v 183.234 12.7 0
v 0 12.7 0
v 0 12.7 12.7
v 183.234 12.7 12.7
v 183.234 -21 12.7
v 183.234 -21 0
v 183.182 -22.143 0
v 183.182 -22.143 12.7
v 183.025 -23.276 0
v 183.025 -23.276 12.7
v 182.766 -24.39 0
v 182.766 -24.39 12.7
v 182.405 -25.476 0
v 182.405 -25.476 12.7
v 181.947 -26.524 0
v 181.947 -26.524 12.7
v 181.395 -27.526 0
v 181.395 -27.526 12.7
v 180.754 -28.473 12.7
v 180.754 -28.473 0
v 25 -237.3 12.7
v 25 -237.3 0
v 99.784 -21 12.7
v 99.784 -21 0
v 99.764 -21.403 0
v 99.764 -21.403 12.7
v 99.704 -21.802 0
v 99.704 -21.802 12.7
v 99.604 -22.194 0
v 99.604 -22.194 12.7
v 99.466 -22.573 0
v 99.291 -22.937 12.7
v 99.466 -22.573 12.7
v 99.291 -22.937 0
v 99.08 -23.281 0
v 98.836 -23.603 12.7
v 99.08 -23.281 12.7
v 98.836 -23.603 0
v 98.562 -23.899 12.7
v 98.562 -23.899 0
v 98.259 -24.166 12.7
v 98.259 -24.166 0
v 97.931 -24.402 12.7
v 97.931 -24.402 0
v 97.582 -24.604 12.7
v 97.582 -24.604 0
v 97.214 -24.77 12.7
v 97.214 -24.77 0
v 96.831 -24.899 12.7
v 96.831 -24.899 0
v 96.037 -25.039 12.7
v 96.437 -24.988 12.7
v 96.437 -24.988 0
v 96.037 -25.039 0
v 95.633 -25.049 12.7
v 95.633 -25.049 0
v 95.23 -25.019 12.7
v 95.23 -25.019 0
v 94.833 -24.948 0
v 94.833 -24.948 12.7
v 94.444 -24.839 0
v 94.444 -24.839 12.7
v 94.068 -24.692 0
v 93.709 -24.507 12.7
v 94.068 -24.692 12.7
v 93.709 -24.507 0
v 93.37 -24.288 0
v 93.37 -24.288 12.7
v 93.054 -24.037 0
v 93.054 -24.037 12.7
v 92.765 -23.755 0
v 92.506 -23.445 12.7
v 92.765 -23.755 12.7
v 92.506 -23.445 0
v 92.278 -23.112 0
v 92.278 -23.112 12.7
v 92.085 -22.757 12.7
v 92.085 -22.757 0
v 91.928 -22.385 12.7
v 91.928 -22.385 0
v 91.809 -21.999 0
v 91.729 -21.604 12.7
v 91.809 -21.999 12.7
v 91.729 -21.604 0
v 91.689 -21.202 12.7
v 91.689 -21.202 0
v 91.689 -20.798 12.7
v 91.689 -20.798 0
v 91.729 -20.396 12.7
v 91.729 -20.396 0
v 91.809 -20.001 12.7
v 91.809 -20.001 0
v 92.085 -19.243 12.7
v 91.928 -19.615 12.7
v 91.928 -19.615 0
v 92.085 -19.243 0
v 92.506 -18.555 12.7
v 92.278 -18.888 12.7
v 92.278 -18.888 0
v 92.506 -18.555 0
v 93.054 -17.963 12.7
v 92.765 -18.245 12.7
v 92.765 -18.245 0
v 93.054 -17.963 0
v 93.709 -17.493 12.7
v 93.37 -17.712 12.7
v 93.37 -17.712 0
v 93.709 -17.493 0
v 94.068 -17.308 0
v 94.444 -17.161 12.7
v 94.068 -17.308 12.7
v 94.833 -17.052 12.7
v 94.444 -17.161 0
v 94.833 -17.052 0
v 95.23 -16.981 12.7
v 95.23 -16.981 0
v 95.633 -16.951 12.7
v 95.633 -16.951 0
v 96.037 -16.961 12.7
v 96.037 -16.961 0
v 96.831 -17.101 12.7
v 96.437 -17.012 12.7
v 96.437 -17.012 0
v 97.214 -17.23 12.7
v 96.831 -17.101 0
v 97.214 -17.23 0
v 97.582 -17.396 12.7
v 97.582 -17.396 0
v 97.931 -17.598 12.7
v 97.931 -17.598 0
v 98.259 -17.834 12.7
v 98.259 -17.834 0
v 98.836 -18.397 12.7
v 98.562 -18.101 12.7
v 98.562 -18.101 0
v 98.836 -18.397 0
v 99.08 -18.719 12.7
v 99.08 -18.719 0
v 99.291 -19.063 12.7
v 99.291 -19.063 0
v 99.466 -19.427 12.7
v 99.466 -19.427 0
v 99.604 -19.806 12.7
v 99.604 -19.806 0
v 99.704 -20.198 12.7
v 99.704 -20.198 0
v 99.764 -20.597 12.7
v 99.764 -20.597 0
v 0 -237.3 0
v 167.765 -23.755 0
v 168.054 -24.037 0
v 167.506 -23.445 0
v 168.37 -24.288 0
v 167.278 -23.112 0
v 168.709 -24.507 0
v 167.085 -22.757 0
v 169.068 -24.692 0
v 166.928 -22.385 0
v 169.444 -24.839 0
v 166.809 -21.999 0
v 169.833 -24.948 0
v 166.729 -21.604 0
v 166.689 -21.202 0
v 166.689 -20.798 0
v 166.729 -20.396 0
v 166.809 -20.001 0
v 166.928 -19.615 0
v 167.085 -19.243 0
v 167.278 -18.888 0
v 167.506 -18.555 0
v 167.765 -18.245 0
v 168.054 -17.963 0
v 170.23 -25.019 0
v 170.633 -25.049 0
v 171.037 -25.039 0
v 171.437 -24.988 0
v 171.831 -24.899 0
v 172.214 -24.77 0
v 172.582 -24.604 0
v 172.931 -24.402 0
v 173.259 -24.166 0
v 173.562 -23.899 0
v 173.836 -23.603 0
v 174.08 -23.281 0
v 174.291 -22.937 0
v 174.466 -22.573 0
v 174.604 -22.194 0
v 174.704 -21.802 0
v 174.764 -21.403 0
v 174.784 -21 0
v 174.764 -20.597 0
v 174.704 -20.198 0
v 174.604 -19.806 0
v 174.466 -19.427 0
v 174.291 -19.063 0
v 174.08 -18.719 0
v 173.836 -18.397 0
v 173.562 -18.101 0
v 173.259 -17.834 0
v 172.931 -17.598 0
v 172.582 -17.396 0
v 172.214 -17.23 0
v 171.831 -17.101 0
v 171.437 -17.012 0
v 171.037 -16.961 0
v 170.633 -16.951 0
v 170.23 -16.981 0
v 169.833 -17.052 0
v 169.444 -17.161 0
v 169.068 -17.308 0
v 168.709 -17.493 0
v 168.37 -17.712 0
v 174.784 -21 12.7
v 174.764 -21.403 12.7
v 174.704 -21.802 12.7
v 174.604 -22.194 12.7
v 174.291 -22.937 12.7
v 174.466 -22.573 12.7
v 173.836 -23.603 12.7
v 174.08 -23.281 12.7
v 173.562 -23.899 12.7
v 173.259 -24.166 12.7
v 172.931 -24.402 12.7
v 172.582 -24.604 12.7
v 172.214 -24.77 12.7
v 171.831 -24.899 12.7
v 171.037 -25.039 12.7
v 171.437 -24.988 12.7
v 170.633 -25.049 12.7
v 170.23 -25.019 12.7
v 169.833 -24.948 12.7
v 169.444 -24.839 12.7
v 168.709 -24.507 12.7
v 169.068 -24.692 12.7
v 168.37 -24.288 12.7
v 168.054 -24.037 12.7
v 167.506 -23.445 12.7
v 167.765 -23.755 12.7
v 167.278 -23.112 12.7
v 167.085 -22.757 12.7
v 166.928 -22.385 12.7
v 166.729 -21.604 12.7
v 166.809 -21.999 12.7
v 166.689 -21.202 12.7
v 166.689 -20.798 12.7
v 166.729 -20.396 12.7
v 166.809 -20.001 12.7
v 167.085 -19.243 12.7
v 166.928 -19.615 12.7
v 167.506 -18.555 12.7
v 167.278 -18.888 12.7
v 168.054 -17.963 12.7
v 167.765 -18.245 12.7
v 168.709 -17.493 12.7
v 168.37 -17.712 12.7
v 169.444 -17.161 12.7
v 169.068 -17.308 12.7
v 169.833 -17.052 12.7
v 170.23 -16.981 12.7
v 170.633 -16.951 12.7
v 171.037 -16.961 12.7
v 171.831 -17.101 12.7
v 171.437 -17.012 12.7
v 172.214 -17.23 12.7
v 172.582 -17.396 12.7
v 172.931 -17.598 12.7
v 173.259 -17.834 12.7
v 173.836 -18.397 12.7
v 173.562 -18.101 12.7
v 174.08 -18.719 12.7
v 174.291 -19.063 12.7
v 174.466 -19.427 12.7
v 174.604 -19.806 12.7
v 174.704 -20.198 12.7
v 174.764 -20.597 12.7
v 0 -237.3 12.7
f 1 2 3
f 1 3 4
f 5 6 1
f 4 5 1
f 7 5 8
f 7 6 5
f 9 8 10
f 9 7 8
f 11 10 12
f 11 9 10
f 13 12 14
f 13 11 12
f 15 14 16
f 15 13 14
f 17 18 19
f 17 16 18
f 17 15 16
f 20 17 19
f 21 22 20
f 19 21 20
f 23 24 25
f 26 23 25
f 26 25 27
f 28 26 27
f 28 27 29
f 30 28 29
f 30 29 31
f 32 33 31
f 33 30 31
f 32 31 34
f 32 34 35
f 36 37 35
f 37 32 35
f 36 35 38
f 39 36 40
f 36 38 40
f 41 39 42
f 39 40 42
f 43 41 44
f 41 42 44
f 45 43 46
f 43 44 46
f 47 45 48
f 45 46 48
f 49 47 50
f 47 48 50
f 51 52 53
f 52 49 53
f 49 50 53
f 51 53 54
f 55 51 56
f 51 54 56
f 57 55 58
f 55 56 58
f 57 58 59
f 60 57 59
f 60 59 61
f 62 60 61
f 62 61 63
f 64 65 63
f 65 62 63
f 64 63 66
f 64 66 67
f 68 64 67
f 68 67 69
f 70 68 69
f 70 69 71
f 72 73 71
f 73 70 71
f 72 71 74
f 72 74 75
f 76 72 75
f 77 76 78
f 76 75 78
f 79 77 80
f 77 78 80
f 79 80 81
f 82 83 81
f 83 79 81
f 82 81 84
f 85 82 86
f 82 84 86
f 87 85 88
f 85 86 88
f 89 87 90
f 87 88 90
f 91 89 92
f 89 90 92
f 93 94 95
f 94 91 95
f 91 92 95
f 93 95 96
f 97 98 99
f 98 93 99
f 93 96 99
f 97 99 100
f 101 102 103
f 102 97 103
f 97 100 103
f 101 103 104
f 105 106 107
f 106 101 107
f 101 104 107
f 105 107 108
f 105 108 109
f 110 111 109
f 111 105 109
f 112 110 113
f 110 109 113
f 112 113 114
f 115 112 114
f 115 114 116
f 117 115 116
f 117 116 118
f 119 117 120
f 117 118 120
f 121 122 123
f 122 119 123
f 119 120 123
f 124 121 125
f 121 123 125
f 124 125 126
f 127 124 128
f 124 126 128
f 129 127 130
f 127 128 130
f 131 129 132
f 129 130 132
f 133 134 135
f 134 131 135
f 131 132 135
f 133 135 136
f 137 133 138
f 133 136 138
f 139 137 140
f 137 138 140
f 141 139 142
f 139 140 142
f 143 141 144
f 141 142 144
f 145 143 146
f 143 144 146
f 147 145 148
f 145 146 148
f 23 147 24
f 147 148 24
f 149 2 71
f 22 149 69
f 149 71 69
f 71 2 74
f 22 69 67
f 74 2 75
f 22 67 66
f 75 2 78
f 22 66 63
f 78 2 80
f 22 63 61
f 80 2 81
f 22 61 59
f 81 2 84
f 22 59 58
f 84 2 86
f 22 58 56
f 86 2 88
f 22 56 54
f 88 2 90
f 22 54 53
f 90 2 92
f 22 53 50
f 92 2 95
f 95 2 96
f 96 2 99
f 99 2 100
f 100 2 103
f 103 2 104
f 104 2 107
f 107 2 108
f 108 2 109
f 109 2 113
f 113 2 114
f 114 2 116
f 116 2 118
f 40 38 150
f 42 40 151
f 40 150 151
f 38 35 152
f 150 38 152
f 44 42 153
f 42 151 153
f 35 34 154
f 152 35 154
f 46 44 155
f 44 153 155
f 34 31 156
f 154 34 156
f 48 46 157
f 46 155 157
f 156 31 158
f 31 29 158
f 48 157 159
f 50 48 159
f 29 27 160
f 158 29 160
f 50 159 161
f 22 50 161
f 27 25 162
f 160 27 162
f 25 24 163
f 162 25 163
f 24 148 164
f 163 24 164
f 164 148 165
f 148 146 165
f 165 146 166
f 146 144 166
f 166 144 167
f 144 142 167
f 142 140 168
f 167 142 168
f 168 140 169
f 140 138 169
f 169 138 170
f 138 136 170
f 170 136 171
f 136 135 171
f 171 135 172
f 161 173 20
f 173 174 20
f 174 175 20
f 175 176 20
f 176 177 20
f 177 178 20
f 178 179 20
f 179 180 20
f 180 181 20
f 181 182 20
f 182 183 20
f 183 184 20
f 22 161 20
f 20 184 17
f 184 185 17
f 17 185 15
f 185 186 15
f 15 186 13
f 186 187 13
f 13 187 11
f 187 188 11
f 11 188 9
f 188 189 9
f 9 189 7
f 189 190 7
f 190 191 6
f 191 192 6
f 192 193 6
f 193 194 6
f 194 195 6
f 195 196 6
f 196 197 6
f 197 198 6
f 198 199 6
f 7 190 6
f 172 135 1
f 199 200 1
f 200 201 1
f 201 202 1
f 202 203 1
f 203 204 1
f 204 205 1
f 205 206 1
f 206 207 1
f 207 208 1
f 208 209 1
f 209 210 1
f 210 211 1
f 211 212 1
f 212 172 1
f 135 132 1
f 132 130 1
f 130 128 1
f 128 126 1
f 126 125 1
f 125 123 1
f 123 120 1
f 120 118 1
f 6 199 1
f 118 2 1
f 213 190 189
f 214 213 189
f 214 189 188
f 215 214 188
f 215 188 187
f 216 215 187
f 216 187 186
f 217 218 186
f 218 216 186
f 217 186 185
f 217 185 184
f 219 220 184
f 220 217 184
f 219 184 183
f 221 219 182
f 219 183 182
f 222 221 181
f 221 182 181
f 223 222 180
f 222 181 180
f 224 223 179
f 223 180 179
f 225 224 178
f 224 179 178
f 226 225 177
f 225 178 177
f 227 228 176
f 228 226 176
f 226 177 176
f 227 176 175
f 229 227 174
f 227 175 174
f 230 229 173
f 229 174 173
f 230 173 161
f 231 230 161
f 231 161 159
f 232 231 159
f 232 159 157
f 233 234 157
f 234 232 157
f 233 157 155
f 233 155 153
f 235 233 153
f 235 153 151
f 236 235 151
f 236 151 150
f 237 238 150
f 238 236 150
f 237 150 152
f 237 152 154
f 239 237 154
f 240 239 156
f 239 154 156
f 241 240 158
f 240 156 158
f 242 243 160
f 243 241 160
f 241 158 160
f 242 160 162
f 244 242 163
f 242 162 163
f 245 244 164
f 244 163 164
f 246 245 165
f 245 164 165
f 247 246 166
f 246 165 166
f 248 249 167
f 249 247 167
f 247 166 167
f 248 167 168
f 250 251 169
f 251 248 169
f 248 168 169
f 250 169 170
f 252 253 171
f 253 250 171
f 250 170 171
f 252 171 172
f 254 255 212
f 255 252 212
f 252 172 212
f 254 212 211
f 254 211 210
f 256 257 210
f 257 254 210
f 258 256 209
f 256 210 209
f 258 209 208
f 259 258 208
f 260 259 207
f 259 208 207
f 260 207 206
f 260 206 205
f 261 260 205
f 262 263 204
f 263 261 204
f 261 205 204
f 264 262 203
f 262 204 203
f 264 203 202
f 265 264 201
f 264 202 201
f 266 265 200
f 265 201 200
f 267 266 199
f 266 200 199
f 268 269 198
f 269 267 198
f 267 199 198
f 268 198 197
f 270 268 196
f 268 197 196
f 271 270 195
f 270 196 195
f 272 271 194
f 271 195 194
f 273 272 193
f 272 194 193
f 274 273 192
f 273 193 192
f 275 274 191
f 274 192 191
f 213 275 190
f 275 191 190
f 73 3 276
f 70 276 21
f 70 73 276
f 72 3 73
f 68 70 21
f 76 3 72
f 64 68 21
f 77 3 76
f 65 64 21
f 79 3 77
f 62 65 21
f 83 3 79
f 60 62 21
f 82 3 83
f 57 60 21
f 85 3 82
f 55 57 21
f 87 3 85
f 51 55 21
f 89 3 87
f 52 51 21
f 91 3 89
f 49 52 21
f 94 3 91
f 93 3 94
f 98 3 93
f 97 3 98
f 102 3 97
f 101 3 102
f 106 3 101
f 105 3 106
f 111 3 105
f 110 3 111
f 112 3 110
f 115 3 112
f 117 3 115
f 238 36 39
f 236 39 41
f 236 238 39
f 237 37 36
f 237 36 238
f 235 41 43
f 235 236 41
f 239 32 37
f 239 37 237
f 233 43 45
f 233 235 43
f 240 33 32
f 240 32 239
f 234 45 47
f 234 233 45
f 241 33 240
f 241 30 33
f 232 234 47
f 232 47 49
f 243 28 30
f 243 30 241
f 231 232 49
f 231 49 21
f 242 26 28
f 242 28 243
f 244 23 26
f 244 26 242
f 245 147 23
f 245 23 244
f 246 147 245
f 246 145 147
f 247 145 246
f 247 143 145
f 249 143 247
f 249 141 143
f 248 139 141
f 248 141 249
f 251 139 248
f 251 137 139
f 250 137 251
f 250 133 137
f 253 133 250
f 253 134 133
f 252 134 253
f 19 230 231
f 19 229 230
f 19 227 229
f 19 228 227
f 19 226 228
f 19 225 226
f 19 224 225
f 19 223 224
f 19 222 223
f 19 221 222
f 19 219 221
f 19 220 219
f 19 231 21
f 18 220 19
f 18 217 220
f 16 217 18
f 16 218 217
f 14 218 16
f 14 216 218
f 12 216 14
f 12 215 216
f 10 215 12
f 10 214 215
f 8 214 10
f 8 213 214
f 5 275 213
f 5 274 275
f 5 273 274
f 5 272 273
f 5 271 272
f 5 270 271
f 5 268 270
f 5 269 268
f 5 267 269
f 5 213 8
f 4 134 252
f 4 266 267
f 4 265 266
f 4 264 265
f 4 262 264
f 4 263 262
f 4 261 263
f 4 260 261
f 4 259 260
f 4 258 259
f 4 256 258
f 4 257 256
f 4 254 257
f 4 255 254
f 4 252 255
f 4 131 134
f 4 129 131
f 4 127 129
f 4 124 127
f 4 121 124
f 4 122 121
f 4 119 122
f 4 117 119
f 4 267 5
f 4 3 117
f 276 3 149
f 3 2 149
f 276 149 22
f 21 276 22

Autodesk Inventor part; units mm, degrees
ref_plane "YZ Plane" through (0, 0, 0) normal (1, 0, 0) x (0, 1, 0)
ref_plane "XZ Plane" through (0, 0, 0) normal (0, 1, 0) x (-1, 0, 0)
ref_plane "XY Plane" through (0, 0, 0) normal (0, 0, 1) x (1, 0, 0)
ref_plane "Work Plane1" through (0, 0, 0) normal (0, 0, 1) x (1, 0, 0)
sketch "Sketch1" plane through (0, 0, 0) normal (0, 0, 1) x (1, 0, 0)
  circle A0 centre (95.734, -21) radius 4.05 projected
  circle A1 centre (170.734, -21) radius 4.05 projected
  line L0 (78.234, -5) -> (78.234, 0) projected
  arc A2 (83.234, -10) -> (78.234, -5) centre (78.234, -10) ccw projected
  line L1 (83.234, -10) -> (83.234, -21) projected
  arc A3 (83.234, -21) -> (108.234, -21) centre (95.734, -21) ccw projected
  line L2 (108.234, -21) -> (108.234, -10) projected
  arc A4 (113.234, -5) -> (108.234, -10) centre (113.234, -10) ccw projected
  line L3 (113.234, -5) -> (153.234, -5) projected
  arc A5 (158.234, -10) -> (153.234, -5) centre (153.234, -10) ccw projected
  line L4 (158.234, -10) -> (158.234, -21) projected
  arc A6 (158.234, -21) -> (183.234, -21) centre (170.734, -21) ccw projected
  line L5 (183.234, -21) -> (183.234, -10) projected
  arc A7 (188.234, -5) -> (183.234, -10) centre (188.234, -10) ccw projected
  line L6 (188.234, 0) -> (188.234, -5) projected
  line L7 (78.234, 0) -> (188.234, 0) projected
  line L8 (437.5, 12.7) -> (437.5, 0) projected
  line L9 (0, 12.7) -> (437.5, 12.7) projected
  line L10 (0, 0) -> (0, 12.7) projected
  line L11 (437.5, 0) -> (0, 0) projected
  line L12 (0, 12.7) -> (0, -237.3)
  line L13 (0, -237.3) -> (25, -237.3)
  line L14 (25, -237.3) -> (180.7539, -28.4734)
  line L15 (183.234, -10) -> (183.234, 12.7)
  line L16 (183.234, 12.7) -> (0, 12.7)
  dimension "d0" = 25
  dimension "d2" = 250
extrude "Extrusion1" add sketch "Sketch1" along normal blind 12.7 contours A2 L1 A3 L2 A4 L3 A5 L4 A6 L14 L13 L12 L11 L0 | L0 L7 L15 L5 A6 L4 A5 L3 A4 L2 A3 L1 A2 | L11 L10 L9 L15 L7
properties part number "support"
